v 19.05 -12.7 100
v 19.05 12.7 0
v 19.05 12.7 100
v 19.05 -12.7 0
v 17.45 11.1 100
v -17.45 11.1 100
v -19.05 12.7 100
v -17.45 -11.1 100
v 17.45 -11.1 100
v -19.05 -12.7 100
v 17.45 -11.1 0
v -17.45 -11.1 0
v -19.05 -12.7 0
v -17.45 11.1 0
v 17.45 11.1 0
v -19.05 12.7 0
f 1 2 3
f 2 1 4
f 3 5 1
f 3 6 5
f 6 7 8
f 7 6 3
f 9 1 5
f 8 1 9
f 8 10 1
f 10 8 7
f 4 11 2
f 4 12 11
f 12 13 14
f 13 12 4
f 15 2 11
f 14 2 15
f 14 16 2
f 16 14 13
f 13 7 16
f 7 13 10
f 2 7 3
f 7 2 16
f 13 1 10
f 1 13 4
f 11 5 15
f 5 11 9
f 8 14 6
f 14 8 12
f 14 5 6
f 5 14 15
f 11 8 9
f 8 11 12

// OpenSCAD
// Aluminium rectangular box section (RHS)
// Outer: 38.1mm x 25.4mm, wall: 1.6mm
// Length is parameterized.

outer_w = 38.1;   // mm
outer_h = 25.4;   // mm
wall    = 1.6;    // mm
length  = 100;    // mm (change as needed)

inner_w = outer_w - 2*wall;
inner_h = outer_h - 2*wall;

$fn = 64;

module box_section(len=length, ow=outer_w, oh=outer_h, t=wall) {
    iw = ow - 2*t;
    ih = oh - 2*t;
    if (iw <= 0 || ih <= 0) {
        echo("ERROR: Wall thickness too large for given outer dimensions.");
    } else {
        difference() {
            // Outer tube
            translate([-ow/2, -oh/2, 0])
                cube([ow, oh, len], center=false);

            // Inner void
            translate([-iw/2, -ih/2, -0.01])
                cube([iw, ih, len + 0.02], center=false);
        }
    }
}

box_section();
